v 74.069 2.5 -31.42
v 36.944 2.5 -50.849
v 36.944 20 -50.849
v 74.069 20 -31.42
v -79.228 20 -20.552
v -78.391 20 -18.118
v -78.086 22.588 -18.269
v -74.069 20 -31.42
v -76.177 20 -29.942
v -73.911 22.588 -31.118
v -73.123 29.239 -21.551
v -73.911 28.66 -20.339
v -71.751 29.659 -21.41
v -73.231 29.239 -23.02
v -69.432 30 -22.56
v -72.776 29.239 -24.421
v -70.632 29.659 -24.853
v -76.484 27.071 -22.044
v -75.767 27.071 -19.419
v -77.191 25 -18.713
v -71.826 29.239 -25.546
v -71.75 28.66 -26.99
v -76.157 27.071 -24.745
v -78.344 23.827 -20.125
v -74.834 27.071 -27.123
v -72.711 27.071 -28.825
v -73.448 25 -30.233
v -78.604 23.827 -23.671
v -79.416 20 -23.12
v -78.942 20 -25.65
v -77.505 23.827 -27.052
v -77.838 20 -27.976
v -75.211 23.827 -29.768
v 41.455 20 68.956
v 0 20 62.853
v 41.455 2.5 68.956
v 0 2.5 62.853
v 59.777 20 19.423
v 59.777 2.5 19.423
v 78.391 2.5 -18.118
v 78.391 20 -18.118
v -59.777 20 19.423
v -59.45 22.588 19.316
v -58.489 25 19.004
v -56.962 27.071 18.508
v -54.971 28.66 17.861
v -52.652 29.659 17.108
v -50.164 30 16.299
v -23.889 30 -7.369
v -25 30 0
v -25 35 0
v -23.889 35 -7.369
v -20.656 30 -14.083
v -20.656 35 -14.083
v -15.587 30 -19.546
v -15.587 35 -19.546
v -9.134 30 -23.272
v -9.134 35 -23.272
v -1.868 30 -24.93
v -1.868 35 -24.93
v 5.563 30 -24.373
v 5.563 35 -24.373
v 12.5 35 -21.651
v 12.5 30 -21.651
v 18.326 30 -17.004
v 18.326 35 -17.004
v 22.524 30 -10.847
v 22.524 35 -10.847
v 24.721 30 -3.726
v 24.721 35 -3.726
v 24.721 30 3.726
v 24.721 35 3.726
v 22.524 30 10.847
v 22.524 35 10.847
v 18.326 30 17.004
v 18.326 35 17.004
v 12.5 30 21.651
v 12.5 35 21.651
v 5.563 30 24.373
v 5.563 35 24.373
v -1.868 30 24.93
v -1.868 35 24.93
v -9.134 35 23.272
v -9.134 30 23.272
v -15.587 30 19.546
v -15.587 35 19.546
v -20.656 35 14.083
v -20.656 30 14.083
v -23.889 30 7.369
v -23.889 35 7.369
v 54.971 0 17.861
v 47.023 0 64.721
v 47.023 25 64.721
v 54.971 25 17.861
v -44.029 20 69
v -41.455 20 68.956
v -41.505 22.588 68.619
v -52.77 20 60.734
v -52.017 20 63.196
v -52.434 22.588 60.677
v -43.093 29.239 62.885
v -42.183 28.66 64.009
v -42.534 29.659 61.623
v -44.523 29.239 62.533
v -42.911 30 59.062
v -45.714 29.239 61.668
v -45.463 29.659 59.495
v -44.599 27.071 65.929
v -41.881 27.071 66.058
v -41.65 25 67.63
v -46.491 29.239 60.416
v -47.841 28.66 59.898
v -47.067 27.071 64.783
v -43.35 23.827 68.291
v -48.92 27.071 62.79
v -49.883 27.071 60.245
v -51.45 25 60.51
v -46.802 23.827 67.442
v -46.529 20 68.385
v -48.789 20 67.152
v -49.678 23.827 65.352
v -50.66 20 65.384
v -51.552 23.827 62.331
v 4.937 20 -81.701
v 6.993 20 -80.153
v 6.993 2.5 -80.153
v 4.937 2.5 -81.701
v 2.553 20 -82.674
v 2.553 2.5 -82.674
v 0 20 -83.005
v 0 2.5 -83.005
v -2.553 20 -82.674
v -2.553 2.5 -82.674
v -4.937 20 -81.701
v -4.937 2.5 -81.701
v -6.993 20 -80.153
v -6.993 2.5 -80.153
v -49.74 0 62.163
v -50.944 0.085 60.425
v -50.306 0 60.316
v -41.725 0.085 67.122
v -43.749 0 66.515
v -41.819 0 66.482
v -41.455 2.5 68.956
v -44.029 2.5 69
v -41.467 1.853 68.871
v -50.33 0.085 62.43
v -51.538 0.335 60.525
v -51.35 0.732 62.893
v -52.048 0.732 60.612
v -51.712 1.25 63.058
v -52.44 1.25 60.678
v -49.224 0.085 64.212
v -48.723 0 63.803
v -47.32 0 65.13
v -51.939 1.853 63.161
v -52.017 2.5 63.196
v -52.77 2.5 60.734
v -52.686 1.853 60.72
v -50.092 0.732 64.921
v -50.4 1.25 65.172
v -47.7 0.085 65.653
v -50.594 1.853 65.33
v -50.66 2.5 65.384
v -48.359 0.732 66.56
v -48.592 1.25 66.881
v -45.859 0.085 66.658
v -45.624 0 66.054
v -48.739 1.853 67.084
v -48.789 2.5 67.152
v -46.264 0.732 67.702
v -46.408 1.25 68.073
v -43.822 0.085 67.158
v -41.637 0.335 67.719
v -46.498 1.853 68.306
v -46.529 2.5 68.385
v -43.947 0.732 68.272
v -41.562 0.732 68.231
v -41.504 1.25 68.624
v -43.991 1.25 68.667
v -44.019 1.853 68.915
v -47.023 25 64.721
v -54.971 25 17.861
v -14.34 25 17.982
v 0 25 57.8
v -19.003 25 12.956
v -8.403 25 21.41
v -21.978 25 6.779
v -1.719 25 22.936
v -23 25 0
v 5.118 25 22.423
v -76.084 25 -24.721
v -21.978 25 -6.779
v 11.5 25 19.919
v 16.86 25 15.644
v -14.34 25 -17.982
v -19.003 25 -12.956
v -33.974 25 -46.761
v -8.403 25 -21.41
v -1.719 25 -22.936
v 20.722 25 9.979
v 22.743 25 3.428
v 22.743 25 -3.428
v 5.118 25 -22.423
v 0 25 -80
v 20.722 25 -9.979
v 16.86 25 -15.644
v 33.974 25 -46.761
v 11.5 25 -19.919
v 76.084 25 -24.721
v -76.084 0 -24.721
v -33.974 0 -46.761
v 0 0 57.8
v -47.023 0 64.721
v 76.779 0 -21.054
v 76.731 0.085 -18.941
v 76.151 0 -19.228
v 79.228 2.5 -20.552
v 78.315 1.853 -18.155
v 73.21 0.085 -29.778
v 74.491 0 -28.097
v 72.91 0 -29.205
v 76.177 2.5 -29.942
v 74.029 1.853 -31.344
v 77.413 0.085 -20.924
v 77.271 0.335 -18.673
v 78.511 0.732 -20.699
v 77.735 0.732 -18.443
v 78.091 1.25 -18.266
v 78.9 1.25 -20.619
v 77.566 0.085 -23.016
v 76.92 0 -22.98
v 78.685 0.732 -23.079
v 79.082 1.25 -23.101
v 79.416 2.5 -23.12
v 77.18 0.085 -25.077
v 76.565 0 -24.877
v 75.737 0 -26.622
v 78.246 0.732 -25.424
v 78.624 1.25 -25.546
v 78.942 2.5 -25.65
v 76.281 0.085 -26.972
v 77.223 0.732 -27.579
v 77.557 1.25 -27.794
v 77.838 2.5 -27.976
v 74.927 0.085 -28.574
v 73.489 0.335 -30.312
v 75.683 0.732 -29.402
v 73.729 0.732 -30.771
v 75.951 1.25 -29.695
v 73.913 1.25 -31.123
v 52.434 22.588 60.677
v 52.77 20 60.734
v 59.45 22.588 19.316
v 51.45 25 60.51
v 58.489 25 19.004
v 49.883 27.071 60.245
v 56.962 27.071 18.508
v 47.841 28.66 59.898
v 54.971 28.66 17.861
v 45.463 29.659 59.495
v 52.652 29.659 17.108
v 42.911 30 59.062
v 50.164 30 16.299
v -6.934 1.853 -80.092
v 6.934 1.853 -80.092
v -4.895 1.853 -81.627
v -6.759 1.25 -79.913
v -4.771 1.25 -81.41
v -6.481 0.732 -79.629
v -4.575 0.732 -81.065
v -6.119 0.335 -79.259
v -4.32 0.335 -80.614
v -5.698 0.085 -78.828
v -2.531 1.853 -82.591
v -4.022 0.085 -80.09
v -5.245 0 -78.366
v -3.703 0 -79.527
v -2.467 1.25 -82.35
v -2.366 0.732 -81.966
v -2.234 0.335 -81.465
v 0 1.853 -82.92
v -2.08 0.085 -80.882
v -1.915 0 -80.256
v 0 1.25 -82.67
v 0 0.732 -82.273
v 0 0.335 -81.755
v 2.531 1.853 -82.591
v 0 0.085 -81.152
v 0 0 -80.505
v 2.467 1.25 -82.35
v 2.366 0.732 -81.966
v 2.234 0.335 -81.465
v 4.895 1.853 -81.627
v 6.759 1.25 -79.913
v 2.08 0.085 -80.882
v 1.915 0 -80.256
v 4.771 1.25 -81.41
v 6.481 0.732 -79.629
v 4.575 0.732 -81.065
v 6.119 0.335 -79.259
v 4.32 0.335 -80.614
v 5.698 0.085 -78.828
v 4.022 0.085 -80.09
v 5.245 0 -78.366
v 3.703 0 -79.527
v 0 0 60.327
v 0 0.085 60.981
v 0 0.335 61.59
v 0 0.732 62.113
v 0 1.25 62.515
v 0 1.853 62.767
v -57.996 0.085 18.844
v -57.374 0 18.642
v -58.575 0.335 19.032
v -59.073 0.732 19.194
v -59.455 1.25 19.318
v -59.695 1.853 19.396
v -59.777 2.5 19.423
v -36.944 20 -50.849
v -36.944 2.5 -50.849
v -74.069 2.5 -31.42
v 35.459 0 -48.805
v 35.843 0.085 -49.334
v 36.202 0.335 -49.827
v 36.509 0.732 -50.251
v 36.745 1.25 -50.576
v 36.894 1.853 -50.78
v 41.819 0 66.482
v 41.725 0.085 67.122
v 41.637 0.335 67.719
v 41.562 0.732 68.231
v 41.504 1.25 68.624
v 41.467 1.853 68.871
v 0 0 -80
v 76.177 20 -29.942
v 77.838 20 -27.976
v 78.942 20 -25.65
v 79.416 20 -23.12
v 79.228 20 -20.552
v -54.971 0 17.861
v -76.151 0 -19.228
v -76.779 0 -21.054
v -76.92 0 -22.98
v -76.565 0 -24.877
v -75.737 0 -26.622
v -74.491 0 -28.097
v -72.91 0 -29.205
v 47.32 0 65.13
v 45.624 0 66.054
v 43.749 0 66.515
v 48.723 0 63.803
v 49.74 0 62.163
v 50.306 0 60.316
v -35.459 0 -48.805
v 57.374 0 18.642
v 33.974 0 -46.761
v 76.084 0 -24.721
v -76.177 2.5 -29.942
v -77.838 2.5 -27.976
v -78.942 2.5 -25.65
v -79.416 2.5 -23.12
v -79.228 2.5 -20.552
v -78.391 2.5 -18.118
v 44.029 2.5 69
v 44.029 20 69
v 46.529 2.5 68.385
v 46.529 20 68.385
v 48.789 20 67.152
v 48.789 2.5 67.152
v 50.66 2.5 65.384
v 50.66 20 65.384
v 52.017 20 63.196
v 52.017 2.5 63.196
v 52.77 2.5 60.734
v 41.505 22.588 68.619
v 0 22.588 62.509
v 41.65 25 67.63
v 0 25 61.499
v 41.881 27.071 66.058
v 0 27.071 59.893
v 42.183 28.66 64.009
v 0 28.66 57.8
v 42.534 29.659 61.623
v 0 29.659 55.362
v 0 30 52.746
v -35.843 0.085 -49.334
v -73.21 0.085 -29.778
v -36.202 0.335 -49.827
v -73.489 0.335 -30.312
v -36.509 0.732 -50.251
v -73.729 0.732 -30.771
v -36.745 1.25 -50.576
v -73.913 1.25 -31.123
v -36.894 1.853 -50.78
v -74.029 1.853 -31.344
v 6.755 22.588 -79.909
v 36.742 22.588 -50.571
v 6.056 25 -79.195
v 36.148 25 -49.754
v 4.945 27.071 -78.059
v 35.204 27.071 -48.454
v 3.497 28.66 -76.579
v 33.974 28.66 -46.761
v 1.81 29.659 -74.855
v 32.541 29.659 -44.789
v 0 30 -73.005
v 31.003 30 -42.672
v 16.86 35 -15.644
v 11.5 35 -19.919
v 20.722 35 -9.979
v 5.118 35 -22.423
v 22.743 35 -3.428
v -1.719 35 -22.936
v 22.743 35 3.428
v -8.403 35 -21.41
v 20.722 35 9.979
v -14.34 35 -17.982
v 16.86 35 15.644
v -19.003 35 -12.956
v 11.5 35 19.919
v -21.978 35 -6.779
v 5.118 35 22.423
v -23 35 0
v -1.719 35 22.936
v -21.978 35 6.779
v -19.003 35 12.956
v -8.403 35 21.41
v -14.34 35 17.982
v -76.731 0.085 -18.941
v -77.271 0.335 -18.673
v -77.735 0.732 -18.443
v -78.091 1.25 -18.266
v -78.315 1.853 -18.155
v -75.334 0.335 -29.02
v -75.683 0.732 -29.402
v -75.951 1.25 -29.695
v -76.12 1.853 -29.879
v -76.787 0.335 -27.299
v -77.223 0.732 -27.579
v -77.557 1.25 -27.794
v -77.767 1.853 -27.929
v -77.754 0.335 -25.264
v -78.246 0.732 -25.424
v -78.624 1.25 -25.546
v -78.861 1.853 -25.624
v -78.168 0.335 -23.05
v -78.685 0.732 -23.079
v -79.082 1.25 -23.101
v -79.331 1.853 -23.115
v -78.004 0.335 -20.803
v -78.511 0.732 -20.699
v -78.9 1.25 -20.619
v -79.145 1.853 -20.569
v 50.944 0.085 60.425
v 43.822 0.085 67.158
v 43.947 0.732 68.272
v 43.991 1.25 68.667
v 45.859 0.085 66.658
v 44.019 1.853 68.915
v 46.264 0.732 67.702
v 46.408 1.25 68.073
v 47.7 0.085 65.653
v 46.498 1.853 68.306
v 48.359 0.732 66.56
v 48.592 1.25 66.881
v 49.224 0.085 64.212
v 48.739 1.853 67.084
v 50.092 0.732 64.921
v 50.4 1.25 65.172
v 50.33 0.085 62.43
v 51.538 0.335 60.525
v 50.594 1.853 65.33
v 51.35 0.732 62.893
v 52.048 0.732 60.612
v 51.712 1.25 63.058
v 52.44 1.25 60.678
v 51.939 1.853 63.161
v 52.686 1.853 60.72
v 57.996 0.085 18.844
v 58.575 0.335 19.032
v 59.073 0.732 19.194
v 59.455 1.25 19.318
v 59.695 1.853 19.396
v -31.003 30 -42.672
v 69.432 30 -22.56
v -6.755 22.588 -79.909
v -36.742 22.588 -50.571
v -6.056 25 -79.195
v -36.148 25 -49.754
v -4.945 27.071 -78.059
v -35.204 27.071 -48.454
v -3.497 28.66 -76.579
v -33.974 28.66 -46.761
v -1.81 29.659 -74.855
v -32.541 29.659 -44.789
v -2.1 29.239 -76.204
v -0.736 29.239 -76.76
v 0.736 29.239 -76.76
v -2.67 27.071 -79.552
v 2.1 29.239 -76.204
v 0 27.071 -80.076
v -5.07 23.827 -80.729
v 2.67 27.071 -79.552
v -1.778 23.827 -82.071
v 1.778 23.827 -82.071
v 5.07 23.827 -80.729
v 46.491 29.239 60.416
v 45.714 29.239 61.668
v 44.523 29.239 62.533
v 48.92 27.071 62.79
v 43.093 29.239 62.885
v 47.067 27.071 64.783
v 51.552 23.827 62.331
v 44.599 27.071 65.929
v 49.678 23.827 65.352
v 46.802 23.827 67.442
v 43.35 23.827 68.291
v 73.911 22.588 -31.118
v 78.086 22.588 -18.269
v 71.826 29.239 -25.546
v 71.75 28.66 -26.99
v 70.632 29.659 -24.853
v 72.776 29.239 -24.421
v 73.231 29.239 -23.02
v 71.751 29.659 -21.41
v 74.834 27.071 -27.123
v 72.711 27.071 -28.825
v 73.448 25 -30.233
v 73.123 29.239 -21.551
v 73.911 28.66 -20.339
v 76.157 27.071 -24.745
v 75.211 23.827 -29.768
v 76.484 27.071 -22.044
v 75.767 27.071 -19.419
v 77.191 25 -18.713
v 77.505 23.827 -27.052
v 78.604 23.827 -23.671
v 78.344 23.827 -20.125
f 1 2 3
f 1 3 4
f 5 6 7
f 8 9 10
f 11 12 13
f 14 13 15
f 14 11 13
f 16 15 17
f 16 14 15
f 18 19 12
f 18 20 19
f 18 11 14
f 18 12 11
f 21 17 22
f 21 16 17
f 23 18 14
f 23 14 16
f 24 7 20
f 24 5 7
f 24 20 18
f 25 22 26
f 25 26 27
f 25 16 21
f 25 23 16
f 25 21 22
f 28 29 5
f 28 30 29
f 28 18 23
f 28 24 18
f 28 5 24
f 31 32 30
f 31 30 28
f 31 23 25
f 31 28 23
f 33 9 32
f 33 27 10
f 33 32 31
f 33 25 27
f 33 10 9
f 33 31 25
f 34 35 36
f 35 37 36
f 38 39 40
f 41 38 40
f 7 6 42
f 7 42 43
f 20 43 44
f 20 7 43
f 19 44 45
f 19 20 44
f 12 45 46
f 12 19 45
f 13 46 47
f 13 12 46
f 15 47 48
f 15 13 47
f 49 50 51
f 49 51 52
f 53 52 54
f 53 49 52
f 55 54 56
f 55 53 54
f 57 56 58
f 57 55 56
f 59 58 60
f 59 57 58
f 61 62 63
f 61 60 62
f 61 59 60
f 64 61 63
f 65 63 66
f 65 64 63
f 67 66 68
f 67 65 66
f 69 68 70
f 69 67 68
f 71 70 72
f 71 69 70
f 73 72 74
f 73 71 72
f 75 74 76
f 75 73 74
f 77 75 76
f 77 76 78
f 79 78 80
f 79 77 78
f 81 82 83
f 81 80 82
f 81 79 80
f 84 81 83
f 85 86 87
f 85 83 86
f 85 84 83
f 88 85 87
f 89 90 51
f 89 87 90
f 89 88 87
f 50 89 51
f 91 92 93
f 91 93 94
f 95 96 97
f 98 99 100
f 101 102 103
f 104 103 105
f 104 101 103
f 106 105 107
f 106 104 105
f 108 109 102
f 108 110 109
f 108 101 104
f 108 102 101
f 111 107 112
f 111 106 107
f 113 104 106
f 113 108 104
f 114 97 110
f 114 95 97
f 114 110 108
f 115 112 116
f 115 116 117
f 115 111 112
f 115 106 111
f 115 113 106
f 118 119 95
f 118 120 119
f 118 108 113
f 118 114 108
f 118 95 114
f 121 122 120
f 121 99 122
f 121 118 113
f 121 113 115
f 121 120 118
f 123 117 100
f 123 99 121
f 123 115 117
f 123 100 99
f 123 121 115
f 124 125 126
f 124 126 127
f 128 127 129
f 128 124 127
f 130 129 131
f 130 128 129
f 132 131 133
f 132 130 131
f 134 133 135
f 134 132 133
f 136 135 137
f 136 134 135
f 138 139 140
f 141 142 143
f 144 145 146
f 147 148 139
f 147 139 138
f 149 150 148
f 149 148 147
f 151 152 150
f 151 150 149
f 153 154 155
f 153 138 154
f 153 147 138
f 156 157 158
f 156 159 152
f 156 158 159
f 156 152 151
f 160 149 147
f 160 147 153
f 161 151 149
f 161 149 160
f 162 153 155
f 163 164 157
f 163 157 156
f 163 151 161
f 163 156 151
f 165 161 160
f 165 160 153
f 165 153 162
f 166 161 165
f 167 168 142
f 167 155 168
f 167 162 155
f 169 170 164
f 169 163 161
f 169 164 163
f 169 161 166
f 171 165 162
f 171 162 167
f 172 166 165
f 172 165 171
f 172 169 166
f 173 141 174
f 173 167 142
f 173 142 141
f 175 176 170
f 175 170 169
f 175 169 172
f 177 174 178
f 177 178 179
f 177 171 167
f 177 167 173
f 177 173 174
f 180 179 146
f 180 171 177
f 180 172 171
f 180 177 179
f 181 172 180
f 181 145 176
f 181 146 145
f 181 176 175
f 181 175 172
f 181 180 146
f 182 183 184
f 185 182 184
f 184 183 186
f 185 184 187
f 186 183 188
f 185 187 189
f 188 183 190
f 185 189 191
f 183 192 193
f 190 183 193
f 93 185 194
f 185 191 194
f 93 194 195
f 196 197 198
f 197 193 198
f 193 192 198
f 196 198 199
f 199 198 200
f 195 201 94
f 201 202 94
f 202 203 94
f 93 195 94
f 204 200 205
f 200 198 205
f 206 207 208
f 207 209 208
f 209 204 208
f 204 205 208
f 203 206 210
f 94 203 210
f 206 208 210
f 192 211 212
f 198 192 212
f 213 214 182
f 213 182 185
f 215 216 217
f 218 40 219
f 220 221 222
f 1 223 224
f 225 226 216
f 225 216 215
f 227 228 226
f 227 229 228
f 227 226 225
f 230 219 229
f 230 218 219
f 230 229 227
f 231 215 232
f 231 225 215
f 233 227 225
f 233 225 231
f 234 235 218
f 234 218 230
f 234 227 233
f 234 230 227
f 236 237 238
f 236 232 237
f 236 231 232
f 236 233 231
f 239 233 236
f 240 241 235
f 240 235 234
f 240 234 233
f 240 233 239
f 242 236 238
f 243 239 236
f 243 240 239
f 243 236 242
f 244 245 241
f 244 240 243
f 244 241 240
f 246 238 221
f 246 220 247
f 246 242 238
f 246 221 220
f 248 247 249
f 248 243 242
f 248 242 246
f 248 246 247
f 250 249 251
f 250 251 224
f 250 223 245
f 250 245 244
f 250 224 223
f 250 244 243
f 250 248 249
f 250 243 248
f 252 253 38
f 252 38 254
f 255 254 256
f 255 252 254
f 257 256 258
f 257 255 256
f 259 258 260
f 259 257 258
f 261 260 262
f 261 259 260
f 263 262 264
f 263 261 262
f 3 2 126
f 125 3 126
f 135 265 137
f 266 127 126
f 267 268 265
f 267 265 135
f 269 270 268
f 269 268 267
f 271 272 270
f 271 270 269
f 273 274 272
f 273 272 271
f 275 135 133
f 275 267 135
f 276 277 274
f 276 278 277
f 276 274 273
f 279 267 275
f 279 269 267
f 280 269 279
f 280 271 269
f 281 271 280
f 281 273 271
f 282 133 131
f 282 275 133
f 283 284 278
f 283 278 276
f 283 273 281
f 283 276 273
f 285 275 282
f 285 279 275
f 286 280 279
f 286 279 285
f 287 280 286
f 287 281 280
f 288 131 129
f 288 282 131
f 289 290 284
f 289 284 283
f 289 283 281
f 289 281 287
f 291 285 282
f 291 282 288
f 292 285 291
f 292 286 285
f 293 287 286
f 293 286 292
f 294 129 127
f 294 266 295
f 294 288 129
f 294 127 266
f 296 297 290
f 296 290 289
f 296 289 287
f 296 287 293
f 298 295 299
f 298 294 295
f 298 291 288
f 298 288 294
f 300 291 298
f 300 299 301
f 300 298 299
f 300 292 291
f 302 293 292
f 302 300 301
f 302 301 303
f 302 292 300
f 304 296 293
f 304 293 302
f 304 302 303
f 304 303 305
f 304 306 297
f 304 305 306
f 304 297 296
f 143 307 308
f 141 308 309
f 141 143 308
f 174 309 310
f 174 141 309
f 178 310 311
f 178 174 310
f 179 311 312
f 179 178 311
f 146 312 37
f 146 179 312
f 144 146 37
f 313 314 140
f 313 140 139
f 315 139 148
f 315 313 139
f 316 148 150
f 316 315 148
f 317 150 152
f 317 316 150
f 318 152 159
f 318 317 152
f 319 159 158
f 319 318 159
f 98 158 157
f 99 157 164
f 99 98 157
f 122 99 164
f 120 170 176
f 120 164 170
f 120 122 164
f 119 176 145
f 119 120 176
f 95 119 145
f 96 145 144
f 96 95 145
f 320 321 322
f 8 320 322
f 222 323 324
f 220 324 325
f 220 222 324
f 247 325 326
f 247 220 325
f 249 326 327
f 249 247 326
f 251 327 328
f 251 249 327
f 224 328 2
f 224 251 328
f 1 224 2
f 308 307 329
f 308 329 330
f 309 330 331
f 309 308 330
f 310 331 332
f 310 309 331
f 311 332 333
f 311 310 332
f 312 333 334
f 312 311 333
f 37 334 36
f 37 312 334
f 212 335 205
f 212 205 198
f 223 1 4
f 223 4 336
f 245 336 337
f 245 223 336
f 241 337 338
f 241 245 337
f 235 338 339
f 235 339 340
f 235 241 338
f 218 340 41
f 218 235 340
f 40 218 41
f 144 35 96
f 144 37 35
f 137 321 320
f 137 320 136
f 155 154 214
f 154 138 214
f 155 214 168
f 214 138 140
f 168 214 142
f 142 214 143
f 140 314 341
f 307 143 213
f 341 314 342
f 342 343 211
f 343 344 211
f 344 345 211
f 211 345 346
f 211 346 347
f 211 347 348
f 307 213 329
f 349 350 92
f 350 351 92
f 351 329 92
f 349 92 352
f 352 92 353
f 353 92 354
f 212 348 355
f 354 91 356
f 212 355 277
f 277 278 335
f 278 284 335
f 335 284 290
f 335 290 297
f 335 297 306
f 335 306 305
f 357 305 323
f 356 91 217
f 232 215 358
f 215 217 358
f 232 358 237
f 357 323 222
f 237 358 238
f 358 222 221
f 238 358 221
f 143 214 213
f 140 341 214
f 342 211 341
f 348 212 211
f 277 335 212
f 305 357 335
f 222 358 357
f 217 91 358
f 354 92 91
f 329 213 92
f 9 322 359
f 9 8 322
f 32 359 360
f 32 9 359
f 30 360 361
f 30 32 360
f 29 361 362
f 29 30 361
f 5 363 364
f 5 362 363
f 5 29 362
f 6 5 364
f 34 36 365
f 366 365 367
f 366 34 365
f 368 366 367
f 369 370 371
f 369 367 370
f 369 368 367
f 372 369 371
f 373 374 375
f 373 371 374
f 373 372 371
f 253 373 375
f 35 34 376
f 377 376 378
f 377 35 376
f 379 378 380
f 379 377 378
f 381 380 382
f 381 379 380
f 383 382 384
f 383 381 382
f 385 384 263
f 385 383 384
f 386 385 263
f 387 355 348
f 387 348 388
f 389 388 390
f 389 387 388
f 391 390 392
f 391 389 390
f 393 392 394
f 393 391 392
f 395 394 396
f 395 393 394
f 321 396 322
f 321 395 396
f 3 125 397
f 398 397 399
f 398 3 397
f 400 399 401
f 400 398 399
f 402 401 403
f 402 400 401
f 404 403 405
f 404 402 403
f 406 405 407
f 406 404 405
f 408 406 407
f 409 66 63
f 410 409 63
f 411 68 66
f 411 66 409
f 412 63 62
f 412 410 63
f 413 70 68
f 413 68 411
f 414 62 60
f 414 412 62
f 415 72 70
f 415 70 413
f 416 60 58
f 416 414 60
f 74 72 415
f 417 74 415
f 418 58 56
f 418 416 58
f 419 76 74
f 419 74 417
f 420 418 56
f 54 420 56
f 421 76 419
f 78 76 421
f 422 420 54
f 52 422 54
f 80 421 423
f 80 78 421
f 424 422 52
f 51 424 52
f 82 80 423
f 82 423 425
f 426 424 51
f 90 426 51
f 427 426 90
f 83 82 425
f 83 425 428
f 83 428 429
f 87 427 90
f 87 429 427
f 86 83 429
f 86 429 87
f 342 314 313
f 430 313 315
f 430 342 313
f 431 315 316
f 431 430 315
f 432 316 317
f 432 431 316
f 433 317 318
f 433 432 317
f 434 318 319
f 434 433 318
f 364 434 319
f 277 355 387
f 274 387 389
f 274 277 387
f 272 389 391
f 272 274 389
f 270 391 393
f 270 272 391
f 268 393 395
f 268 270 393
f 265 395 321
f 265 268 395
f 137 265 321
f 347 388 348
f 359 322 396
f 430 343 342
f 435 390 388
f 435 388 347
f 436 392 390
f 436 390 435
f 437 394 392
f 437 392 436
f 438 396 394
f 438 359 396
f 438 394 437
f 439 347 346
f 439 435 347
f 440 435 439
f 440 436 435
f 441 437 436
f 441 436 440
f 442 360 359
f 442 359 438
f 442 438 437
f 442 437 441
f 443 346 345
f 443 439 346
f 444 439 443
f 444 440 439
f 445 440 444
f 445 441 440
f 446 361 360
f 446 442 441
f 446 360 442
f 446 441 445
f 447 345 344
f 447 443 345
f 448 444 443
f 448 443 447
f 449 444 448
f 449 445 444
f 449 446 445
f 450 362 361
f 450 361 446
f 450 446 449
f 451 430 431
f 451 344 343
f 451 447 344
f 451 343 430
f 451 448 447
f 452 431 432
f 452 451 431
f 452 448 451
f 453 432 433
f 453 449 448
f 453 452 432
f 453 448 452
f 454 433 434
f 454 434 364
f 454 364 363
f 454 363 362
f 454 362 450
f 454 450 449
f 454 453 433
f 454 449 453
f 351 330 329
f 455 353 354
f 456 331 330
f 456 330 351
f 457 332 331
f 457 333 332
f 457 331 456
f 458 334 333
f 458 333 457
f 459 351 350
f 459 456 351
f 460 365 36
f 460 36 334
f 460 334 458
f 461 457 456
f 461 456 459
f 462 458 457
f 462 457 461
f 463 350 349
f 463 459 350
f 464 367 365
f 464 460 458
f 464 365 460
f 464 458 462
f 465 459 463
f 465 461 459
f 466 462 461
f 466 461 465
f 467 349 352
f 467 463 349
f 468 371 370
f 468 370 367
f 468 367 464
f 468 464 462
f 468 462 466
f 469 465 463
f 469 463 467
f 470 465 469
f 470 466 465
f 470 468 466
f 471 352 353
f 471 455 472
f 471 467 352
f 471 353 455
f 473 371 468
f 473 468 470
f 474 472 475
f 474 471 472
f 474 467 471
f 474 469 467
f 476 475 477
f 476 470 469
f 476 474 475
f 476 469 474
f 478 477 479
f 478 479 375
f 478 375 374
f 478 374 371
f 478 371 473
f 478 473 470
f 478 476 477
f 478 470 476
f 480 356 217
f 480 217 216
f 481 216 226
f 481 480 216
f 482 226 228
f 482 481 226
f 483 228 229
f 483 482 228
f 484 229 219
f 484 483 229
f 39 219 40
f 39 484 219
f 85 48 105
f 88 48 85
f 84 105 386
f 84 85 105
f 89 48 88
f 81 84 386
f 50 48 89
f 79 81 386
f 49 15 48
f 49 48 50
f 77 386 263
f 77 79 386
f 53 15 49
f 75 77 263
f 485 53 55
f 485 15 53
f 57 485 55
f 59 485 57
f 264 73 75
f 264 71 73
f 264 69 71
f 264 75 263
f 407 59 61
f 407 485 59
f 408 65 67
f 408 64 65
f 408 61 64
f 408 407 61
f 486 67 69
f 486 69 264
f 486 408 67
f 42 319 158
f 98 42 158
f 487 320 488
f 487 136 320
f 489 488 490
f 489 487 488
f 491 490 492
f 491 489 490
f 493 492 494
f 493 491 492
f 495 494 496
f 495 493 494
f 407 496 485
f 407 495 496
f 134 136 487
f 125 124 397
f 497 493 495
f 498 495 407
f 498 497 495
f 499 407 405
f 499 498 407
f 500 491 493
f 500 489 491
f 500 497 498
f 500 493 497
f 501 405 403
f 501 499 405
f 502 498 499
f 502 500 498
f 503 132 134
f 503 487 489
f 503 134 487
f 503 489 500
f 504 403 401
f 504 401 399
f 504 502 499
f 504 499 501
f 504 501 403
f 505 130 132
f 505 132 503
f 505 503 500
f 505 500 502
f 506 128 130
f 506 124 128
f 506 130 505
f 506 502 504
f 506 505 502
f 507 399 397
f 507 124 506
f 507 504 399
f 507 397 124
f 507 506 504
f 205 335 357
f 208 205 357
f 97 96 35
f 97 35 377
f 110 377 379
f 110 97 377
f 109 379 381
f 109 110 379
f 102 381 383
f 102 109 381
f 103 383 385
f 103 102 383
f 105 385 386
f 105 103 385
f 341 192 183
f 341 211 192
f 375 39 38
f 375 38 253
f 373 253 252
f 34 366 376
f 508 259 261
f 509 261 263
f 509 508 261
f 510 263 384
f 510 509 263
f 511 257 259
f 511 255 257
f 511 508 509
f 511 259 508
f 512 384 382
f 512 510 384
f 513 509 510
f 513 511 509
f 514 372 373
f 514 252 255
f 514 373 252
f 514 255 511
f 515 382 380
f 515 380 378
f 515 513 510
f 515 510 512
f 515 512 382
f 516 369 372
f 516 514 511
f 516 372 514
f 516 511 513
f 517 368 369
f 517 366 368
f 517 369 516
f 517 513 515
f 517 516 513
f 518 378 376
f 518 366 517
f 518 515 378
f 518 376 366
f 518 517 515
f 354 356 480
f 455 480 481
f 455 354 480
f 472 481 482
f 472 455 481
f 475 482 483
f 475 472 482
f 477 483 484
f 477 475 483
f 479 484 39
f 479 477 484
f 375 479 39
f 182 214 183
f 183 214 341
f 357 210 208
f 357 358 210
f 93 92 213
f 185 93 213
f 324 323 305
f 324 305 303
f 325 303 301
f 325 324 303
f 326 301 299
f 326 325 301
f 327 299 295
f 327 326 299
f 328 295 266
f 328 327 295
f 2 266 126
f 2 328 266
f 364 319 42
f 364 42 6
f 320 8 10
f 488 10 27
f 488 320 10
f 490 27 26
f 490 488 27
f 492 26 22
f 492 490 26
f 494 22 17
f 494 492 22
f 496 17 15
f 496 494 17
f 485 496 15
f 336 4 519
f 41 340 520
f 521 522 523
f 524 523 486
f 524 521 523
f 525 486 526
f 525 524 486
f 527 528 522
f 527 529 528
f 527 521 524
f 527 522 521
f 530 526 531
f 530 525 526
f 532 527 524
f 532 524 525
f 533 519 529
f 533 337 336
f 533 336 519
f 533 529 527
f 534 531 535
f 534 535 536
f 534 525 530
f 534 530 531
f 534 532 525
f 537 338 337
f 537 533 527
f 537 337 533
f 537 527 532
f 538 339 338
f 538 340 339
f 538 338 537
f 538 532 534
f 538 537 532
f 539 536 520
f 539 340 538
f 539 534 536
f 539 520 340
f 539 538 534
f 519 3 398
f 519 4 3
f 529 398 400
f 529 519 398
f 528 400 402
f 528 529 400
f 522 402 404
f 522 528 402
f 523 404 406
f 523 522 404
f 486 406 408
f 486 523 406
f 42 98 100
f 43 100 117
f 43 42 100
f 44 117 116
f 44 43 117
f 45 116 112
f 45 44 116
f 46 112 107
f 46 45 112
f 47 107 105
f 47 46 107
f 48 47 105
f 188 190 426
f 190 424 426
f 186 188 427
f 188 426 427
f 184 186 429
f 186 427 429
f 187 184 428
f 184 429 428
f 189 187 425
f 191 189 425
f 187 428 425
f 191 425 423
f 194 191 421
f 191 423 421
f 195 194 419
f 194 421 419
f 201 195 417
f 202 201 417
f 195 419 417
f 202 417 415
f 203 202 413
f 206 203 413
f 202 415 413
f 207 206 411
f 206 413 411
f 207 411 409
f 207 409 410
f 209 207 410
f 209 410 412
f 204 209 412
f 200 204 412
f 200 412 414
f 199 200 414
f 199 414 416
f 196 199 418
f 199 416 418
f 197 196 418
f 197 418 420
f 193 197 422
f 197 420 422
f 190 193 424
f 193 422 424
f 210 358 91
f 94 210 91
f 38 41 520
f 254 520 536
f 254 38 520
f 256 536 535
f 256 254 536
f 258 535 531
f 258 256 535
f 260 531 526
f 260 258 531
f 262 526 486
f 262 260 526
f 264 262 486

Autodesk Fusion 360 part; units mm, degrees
sketch "Sketch1" plane through (0, 0, 0) normal (0, 1, 0) x (1, 0, 0)
  line L0 (0, 80) -> (-33.9737, 46.7608)
  line L1 (0, 80) -> (33.9737, 46.7608)
  line L2 (-76.0845, 24.7214) -> (-33.9737, 46.7608)
  line L3 (-76.0845, 24.7214) -> (-54.9706, -17.861)
  line L4 (-47.0228, -64.7214) -> (-54.9706, -17.861)
  line L5 (-47.0228, -64.7214) -> (0, -57.7996)
  line L6 (47.0228, -64.7214) -> (0, -57.7996)
  line L7 (47.0228, -64.7214) -> (54.9706, -17.861)
  line L8 (76.0845, 24.7214) -> (54.9706, -17.861)
  line L9 (76.0845, 24.7214) -> (33.9737, 46.7608)
  circle A0 centre (0, 0) radius 25
  dimension "d35" = 50
extrude "Extrude1" add sketch "Sketch1" along normal blind 25 contours L0 L1 L2 L3 L4 L5 L6 L7 L8 L9 | A0 makes body 1
shell "Shell1" thickness 5 outward yes removed faces 1 at (11.3246, 25, -3.6796) on bodies 1
extrude "Extrude2" add 1 faces at (-65.2553, 25, -34.1513) along direction (0, 1, 0) blind 5 separate body on bodies 1 makes body 2
extrude "Extrude3" add sketch "Sketch1" along normal blind 30 separate body contours L0 L1 L2 L3 L4 L5 L6 L7 L8 L9 | A0 makes body 3
extrude "Extrude4" cut 1 faces at (11.3246, 0, -3.6796) along direction (0, 1, 0) blind 25 on bodies 3 bodies 3
sketch "Sketch2" plane through (0, 30, 0) normal (0, 1, 0) x (-1, 0, 0)
  line L0 (-47.0228, 64.7214) -> (-54.9706, 17.861)
  line L1 (-54.9706, 17.861) -> (-76.0845, -24.7214)
  line L2 (-76.0845, -24.7214) -> (-33.9737, -46.7608)
  line L3 (-33.9737, -46.7608) -> (0, -80)
  line L4 (0, -80) -> (33.9737, -46.7608)
  line L5 (33.9737, -46.7608) -> (76.0845, -24.7214)
  line L6 (76.0845, -24.7214) -> (54.9706, 17.861)
  line L7 (54.9706, 17.861) -> (47.0228, 64.7214)
  line L8 (47.0228, 64.7214) -> (0, 57.7996)
  line L9 (0, 57.7996) -> (-47.0228, 64.7214)
  circle A0 centre (0, 0) radius 25
  dimension "d65" = 50
extrude "Extrude9" cut sketch "Sketch1" against normal blind 10 bodies 1 makes body 4 at (-6.7759, 0, 1.242)
extrude "Extrude10" cut 1 faces at (-6.7759, -5, 1.242) along direction (0, 1, 0) blind 10 on bodies 4 bodies 4
delete_body "RemoveBody1" bodies 4
extrude "Extrude14" cut sketch "Sketch2" against normal blind 5 contours A0 bodies 3
extrude "Extrude15" add sketch "Sketch2" along normal blind 5 separate body contours A0 makes body 5
shell "Shell5" thickness 2 removed faces 1 at (6.7759, 35, -1.242) on bodies 5
extrude "Extrude16" cut 1 faces at (-4.7801, 32, 5.994) along direction (0, -1, 0) blind 10 on bodies 5 bodies 5
extrude "Extrude17" add 1 faces at (-24.1546, 30, -2.3847) along direction (0, -1, 0) blind 5 on bodies 5 bodies 3 5
combine "Combine1" operation add target body 2 tool bodies 1 3
fillet "Fillet1" radius 10 5 edges at (-51.1344, 12.5, 70.3805) (-82.7372, 12.5, -26.8829) (0, 12.5, -86.995) (82.7372, 12.5, -26.8829) (51.1344, 12.5, 70.3805) on bodies 2
extrude "Extrude18" cut 1 faces at (29.4926, -5, 63.8255) along direction (0, 1, 0) blind 5 on bodies 2 bodies 2
fillet "Fillet2" radius 10 15 edges at (56.2738, 30, 40.0786) (48.7891, 30, 67.1524) (20.7275, 30, 65.9045) (55.5066, 30, -41.1346) (78.9424, 30, -25.6499) (69.0841, 30, 0.6526) (-21.9688, 30, -65.5012) (0, 30, -83.005) (21.9688, 30, -65.5012) (-69.0841, 30, 0.6526) (-78.9424, 30, -25.6499) (-55.5066, 30, -41.1346) (-20.7275, 30, 65.9045) (-48.7891, 30, 67.1524) (-56.2738, 30, 40.0786) on bodies 2
fillet "Fillet3" radius 2.5 15 edges at (69.0841, 0, 0.6526) (78.9424, 0, -25.6499) (55.5066, 0, -41.1346) (21.9688, 0, -65.5012) (0, 0, -83.005) (-21.9688, 0, -65.5012) (-55.5066, 0, -41.1346) (-78.9424, 0, -25.6499) (-69.0841, 0, 0.6526) (-56.2738, 0, 40.0786) (-48.7891, 0, 67.1524) (-20.7275, 0, 65.9045) (20.7275, 0, 65.9045) (48.7891, 0, 67.1524) (56.2738, 0, 40.0786) on bodies 2
extrude "Extrude19" add sketch "Sketch1" along normal blind 5 separate body makes body 6
extrude "Extrude20" add sketch "Sketch1" along normal blind 5 contours A0 bodies 6
shell "Shell6" thickness 2 removed faces 1 at (11.3246, 5, -3.6796) on bodies 6
hidden bodies 6
